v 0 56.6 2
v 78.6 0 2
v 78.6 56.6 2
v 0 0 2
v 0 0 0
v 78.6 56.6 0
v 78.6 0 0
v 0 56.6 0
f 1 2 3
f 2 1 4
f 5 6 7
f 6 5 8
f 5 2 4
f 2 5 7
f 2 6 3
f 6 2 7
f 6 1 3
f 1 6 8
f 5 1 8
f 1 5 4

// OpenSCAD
pcb_w = 78;
pcb_l = 56;
clearance = 0.3;
inner_size = [pcb_w + 2*clearance, pcb_l + 2*clearance];
cube([inner_size[0], inner_size[1], 2]);
